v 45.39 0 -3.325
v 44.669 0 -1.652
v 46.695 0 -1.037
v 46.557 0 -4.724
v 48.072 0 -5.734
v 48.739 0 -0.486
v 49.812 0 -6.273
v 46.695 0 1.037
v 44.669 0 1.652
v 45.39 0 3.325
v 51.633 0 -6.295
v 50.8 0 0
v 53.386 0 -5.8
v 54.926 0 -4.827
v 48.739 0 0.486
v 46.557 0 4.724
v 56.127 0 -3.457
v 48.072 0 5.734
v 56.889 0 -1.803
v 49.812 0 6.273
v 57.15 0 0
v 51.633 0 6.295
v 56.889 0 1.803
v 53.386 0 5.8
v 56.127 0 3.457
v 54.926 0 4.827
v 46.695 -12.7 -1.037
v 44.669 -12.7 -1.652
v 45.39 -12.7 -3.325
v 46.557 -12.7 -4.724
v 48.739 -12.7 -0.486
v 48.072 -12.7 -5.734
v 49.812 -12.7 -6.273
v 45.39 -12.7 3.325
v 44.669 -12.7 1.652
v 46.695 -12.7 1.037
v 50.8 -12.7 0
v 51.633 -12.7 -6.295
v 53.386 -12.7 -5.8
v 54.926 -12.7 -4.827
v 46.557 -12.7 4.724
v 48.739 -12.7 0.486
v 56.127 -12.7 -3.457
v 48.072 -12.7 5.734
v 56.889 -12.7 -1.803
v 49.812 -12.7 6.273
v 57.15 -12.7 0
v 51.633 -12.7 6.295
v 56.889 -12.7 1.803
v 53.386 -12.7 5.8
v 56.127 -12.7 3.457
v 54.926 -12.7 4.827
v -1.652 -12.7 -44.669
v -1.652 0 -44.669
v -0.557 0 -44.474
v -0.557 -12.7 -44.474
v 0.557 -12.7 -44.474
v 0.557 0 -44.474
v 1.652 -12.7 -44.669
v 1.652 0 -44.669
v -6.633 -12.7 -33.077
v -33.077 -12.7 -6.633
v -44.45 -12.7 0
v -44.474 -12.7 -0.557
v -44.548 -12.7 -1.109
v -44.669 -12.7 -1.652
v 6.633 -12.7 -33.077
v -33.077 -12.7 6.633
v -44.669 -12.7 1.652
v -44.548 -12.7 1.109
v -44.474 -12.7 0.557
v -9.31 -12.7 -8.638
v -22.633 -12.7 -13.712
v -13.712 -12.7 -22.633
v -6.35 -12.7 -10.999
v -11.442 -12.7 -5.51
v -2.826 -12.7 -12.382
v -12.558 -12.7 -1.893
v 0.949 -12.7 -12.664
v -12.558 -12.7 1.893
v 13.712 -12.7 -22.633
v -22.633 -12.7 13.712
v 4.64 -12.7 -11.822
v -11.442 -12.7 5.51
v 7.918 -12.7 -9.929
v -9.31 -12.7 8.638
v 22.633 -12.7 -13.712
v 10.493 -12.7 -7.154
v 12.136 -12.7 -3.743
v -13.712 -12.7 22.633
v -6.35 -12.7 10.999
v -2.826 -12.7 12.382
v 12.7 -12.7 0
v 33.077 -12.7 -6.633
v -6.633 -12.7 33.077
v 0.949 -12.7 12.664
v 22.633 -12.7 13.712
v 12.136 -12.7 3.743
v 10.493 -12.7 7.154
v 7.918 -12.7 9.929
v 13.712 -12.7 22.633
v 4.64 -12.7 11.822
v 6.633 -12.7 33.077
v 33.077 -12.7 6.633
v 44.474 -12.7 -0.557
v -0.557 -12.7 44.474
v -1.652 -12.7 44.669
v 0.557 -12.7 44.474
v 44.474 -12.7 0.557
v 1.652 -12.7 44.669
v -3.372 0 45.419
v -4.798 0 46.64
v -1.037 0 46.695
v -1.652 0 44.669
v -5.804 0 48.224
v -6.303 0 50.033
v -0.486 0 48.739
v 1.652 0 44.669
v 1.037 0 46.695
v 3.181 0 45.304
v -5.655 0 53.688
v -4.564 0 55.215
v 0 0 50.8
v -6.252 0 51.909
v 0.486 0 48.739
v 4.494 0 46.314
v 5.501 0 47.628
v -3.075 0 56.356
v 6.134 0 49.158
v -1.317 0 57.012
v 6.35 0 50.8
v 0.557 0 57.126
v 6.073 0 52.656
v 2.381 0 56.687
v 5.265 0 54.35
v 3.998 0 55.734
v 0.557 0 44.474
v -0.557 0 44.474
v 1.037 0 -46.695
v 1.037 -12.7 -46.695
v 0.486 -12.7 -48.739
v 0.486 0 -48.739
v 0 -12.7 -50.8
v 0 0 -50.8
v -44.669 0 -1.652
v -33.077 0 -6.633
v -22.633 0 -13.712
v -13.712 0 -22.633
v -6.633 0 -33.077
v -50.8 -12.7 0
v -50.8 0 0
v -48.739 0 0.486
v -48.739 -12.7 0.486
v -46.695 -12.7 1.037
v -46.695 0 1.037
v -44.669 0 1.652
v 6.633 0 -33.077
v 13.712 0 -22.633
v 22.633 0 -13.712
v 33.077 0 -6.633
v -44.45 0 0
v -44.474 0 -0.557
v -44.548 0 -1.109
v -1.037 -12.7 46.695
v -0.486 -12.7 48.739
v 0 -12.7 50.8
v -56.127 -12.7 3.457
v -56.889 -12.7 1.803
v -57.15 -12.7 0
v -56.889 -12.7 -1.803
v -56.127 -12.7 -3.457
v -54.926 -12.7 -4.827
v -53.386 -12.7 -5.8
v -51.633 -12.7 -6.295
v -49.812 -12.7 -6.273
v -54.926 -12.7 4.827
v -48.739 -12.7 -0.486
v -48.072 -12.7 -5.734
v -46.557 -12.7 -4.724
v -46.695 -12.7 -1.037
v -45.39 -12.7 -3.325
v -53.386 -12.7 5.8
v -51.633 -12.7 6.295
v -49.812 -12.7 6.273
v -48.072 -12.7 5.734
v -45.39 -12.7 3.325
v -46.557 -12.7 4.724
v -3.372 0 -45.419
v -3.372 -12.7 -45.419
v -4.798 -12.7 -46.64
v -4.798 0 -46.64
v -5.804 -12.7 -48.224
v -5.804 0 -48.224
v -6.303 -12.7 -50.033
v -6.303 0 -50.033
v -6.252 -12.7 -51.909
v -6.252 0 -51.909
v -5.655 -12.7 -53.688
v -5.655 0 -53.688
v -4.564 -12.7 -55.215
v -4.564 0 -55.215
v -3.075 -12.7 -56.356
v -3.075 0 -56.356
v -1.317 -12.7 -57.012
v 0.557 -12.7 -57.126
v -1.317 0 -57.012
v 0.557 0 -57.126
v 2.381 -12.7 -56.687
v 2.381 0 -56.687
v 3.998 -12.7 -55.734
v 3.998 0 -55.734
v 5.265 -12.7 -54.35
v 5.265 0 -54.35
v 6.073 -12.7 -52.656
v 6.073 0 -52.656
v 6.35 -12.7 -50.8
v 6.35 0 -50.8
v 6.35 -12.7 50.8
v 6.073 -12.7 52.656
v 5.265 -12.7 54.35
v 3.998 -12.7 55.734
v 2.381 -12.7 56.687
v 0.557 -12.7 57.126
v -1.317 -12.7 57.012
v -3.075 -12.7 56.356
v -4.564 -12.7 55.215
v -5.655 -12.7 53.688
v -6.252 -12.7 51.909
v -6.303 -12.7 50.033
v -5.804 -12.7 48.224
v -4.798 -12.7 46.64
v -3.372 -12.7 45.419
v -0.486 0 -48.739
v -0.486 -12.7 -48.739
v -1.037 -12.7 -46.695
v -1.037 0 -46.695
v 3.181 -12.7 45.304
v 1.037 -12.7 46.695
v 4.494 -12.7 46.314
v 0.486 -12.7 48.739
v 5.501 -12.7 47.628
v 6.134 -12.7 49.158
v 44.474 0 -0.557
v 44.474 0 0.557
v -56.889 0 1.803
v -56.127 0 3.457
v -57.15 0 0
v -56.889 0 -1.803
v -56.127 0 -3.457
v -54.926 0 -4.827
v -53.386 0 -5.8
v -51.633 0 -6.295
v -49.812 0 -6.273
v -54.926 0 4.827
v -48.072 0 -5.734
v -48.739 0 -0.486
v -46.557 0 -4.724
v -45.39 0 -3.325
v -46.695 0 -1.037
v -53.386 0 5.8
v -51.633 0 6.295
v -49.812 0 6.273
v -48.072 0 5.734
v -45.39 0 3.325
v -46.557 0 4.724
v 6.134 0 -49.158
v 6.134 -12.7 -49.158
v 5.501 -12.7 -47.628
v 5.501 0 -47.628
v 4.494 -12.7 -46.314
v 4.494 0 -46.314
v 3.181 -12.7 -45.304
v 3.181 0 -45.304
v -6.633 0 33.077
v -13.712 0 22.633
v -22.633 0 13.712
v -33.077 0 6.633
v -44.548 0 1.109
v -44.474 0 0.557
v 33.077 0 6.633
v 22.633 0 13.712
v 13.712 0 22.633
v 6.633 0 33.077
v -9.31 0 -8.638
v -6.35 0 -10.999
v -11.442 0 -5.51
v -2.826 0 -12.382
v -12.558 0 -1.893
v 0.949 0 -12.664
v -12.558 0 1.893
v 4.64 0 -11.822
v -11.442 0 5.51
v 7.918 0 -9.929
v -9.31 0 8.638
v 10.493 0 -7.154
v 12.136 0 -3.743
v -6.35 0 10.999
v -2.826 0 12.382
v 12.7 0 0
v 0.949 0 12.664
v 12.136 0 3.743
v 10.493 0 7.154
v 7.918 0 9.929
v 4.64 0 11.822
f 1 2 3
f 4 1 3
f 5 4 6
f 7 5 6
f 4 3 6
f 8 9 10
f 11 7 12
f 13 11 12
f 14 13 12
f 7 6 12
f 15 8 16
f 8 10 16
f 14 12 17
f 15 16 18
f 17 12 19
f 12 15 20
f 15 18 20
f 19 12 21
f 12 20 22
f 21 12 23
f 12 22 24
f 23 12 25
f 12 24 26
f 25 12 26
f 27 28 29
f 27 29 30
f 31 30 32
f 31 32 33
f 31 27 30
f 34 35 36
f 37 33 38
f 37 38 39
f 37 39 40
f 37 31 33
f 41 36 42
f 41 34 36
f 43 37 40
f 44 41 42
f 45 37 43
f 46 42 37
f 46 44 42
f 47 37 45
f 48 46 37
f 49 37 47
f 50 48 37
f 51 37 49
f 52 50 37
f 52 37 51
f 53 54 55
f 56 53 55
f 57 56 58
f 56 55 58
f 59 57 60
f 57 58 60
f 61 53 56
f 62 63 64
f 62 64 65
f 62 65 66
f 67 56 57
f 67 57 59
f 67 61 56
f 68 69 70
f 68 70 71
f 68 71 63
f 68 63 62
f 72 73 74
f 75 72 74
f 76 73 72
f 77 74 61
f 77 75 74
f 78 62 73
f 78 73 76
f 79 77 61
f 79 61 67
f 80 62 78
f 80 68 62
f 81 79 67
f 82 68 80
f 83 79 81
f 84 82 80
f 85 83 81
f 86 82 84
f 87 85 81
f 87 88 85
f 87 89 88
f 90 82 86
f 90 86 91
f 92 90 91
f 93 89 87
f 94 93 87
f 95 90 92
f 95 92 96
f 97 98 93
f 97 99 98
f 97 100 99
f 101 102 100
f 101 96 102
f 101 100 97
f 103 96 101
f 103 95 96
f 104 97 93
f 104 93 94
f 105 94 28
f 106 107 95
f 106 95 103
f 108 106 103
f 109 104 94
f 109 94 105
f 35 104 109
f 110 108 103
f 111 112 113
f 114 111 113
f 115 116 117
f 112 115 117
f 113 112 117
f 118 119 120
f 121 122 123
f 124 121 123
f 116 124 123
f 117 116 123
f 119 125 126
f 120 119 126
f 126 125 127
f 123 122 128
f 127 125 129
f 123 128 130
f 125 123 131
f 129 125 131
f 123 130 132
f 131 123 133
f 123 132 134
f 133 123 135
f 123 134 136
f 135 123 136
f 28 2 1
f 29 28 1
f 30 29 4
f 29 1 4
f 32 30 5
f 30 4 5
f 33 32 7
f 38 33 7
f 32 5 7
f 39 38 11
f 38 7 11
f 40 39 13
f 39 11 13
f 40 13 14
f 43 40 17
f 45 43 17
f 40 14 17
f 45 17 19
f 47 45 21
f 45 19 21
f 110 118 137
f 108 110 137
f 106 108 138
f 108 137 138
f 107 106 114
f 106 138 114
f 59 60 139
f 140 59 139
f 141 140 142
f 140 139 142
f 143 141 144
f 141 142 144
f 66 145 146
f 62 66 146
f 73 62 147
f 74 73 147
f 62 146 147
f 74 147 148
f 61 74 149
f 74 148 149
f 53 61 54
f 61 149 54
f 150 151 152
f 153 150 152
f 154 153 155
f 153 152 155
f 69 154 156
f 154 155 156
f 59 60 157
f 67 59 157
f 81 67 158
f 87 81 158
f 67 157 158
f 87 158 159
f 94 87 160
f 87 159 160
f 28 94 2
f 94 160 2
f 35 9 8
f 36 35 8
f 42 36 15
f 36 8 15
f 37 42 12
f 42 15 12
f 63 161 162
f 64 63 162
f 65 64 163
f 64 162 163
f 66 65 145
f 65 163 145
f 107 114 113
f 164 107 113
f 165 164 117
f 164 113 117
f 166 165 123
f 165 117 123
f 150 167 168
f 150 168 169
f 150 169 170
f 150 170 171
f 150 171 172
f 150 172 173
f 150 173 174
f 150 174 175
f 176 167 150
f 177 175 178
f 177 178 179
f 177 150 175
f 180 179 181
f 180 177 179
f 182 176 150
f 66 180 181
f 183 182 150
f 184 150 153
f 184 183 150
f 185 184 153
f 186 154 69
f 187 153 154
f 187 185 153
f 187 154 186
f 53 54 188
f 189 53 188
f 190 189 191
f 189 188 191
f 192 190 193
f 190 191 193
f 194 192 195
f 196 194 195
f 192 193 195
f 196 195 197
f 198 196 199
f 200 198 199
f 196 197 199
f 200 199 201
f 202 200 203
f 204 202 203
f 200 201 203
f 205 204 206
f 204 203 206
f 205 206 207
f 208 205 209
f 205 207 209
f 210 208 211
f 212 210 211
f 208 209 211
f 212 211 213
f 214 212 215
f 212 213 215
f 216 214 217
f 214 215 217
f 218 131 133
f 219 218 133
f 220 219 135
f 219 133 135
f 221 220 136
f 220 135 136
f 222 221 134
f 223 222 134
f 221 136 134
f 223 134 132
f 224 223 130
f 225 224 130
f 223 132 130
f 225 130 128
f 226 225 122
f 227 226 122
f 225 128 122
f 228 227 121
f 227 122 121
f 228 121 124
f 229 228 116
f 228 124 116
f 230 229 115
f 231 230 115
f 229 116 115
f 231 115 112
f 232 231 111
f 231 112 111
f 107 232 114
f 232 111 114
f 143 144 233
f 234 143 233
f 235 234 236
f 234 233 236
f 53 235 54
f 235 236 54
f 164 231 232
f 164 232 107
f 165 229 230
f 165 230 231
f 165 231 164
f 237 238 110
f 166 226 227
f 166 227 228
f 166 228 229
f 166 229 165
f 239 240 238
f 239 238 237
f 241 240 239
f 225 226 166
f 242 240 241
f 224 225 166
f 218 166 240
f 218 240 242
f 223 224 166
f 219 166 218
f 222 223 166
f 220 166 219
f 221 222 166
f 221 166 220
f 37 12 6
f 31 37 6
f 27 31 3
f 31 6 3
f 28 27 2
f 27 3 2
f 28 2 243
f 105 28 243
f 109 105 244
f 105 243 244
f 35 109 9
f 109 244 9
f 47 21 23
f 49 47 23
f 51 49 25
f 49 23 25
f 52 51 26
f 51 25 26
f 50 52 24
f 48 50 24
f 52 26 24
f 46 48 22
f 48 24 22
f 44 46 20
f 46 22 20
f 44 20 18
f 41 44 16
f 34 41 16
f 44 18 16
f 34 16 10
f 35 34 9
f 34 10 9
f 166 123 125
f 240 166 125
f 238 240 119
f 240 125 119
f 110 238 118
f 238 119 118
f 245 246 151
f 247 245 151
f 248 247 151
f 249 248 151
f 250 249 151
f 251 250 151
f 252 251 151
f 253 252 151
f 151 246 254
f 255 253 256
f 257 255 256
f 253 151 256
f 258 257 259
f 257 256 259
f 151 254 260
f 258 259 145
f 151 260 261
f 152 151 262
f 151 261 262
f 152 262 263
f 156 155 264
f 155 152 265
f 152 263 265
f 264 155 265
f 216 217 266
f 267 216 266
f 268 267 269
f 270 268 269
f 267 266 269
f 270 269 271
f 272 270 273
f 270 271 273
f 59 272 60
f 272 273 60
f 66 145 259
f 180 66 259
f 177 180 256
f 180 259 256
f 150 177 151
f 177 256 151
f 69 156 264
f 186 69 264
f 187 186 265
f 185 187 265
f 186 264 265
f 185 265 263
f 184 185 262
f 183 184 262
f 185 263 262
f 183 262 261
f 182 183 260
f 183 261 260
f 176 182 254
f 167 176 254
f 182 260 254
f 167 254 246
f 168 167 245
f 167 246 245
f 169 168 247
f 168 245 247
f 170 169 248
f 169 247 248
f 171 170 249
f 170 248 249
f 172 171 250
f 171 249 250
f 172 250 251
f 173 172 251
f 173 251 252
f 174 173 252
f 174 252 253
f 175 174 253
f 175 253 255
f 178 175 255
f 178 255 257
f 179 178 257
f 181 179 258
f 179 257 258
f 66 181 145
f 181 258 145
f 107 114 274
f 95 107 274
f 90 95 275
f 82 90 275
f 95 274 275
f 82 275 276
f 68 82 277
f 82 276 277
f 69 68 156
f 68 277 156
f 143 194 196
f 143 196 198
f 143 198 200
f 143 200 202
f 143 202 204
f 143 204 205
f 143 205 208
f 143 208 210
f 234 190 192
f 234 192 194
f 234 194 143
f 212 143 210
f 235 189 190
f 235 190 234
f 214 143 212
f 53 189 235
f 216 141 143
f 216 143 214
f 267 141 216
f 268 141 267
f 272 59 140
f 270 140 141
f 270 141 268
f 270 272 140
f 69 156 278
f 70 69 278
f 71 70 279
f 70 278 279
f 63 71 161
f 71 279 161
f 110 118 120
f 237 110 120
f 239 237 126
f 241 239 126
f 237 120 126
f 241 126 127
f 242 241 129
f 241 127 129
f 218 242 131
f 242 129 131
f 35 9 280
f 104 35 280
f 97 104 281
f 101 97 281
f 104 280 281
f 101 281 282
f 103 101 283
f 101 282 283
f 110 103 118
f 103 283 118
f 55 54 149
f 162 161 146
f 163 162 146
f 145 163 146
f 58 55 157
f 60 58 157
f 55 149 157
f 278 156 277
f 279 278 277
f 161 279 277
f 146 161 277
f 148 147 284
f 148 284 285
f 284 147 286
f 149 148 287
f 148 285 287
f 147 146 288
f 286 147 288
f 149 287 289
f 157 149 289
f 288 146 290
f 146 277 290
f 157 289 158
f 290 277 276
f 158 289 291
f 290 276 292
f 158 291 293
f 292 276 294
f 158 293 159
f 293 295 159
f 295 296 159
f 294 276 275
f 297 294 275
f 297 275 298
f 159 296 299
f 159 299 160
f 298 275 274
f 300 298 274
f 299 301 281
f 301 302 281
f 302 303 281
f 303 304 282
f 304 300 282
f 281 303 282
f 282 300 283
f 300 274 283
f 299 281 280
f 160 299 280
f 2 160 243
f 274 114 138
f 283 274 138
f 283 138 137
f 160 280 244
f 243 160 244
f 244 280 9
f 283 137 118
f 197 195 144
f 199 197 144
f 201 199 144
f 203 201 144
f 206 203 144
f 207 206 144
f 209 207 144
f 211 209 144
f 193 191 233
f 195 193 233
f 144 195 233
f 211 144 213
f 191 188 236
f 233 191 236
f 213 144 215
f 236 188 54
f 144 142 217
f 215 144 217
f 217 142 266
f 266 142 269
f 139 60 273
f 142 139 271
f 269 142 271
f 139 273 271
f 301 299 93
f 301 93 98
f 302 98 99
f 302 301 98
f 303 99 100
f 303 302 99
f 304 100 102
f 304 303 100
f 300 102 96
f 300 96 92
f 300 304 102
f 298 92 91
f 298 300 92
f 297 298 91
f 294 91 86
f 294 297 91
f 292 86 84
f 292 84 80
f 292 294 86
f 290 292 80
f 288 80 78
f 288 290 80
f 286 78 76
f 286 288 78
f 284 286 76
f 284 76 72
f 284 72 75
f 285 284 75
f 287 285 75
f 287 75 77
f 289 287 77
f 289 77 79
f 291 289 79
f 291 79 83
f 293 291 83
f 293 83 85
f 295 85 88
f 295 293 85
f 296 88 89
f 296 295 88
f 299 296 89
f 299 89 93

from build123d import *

# Parameters (mm, degrees)
F0_R     = 12.7
F1_DEPTH = 12.7


with BuildPart() as f1:
    # F0 (on Front) → F1 (new body)
    with BuildSketch(Plane.XZ):
        with BuildLine():
            ThreePointArc((44.668767972, -1.652420594), (44.45, 0), (44.668767972, 1.652420594))
            ThreePointArc((44.668767972, 1.652420594), (17.9605122421, 17.9605122421), (1.652420594, 44.668767972))
            ThreePointArc((1.652420594, 44.668767972), (0, 44.45), (-1.652420594, 44.668767972))
            ThreePointArc((-1.652420594, 44.668767972), (-17.9605122421, 17.9605122421), (-44.668767972, 1.652420594))
            ThreePointArc((-44.668767972, 1.652420594), (-44.5049295724, 0.8334196489), (-44.45, 0))
            ThreePointArc((-44.45, 0), (-44.5049295724, -0.8334196489), (-44.668767972, -1.652420594))
            ThreePointArc((-44.668767972, -1.652420594), (-17.9605122421, -17.9605122421), (-1.652420594, -44.668767972))
            ThreePointArc((-1.652420594, -44.668767972), (0, -44.45), (1.652420594, -44.668767972))
            ThreePointArc((1.652420594, -44.668767972), (17.9605122421, -17.9605122421), (44.668767972, -1.652420594))
        make_face()
        Circle(F0_R, mode=Mode.SUBTRACT)
    extrude(amount=F1_DEPTH)


with BuildPart() as f1b:
    # F0 (on Front) → F1, piece 2 (new body)
    with BuildSketch(Plane.XZ):
        with BuildLine():
            ThreePointArc((-50.8, 0), (-47.7146734868, 0.7530753794), (-44.668767972, 1.652420594))
            ThreePointArc((-44.668767972, 1.652420594), (-57.15, 0), (-44.668767972, -1.652420594))
            ThreePointArc((-44.668767972, -1.652420594), (-47.7146734868, -0.7530753794), (-50.8, 0))
        make_face()
    extrude(amount=F1_DEPTH)


with BuildPart() as f1c:
    # F0 (on Front) → F1, piece 3 (new body)
    with BuildSketch(Plane.XZ):
        with BuildLine():
            ThreePointArc((0, 50.8), (0.7530753794, 47.7146734868), (1.652420594, 44.668767972))
            ThreePointArc((1.652420594, 44.668767972), (5.0406036728, 46.9380296979), (6.35, 50.8))
            ThreePointArc((6.35, 50.8), (-3.8619703021, 55.8406036728), (-1.652420594, 44.668767972))
            ThreePointArc((-1.652420594, 44.668767972), (-0.7530753794, 47.7146734868), (0, 50.8))
        make_face()
    extrude(amount=F1_DEPTH)


with BuildPart() as f1d:
    # F0 (on Front) → F1, piece 4 (new body)
    with BuildSketch(Plane.XZ):
        with BuildLine():
            ThreePointArc((44.668767972, -1.652420594), (51.6334196489, -6.2950704276), (57.15, 0))
            ThreePointArc((57.15, 0), (51.6334196489, 6.2950704276), (44.668767972, 1.652420594))
            ThreePointArc((44.668767972, 1.652420594), (47.7146734868, 0.7530753794), (50.8, 0))
            ThreePointArc((50.8, 0), (47.7146734868, -0.7530753794), (44.668767972, -1.652420594))
        make_face()
    extrude(amount=F1_DEPTH)


with BuildPart() as f1e:
    # F0 (on Front) → F1, piece 5 (new body)
    with BuildSketch(Plane.XZ):
        with BuildLine():
            ThreePointArc((6.35, -50.8), (5.0406036728, -46.9380296979), (1.652420594, -44.668767972))
            ThreePointArc((1.652420594, -44.668767972), (0.7530753794, -47.7146734868), (0, -50.8))
            ThreePointArc((0, -50.8), (-0.7530753794, -47.7146734868), (-1.652420594, -44.668767972))
            ThreePointArc((-1.652420594, -44.668767972), (-3.8619703021, -55.8406036728), (6.35, -50.8))
        make_face()
    extrude(amount=F1_DEPTH)


solid = Compound([f1.part, f1b.part, f1c.part, f1d.part, f1e.part])
